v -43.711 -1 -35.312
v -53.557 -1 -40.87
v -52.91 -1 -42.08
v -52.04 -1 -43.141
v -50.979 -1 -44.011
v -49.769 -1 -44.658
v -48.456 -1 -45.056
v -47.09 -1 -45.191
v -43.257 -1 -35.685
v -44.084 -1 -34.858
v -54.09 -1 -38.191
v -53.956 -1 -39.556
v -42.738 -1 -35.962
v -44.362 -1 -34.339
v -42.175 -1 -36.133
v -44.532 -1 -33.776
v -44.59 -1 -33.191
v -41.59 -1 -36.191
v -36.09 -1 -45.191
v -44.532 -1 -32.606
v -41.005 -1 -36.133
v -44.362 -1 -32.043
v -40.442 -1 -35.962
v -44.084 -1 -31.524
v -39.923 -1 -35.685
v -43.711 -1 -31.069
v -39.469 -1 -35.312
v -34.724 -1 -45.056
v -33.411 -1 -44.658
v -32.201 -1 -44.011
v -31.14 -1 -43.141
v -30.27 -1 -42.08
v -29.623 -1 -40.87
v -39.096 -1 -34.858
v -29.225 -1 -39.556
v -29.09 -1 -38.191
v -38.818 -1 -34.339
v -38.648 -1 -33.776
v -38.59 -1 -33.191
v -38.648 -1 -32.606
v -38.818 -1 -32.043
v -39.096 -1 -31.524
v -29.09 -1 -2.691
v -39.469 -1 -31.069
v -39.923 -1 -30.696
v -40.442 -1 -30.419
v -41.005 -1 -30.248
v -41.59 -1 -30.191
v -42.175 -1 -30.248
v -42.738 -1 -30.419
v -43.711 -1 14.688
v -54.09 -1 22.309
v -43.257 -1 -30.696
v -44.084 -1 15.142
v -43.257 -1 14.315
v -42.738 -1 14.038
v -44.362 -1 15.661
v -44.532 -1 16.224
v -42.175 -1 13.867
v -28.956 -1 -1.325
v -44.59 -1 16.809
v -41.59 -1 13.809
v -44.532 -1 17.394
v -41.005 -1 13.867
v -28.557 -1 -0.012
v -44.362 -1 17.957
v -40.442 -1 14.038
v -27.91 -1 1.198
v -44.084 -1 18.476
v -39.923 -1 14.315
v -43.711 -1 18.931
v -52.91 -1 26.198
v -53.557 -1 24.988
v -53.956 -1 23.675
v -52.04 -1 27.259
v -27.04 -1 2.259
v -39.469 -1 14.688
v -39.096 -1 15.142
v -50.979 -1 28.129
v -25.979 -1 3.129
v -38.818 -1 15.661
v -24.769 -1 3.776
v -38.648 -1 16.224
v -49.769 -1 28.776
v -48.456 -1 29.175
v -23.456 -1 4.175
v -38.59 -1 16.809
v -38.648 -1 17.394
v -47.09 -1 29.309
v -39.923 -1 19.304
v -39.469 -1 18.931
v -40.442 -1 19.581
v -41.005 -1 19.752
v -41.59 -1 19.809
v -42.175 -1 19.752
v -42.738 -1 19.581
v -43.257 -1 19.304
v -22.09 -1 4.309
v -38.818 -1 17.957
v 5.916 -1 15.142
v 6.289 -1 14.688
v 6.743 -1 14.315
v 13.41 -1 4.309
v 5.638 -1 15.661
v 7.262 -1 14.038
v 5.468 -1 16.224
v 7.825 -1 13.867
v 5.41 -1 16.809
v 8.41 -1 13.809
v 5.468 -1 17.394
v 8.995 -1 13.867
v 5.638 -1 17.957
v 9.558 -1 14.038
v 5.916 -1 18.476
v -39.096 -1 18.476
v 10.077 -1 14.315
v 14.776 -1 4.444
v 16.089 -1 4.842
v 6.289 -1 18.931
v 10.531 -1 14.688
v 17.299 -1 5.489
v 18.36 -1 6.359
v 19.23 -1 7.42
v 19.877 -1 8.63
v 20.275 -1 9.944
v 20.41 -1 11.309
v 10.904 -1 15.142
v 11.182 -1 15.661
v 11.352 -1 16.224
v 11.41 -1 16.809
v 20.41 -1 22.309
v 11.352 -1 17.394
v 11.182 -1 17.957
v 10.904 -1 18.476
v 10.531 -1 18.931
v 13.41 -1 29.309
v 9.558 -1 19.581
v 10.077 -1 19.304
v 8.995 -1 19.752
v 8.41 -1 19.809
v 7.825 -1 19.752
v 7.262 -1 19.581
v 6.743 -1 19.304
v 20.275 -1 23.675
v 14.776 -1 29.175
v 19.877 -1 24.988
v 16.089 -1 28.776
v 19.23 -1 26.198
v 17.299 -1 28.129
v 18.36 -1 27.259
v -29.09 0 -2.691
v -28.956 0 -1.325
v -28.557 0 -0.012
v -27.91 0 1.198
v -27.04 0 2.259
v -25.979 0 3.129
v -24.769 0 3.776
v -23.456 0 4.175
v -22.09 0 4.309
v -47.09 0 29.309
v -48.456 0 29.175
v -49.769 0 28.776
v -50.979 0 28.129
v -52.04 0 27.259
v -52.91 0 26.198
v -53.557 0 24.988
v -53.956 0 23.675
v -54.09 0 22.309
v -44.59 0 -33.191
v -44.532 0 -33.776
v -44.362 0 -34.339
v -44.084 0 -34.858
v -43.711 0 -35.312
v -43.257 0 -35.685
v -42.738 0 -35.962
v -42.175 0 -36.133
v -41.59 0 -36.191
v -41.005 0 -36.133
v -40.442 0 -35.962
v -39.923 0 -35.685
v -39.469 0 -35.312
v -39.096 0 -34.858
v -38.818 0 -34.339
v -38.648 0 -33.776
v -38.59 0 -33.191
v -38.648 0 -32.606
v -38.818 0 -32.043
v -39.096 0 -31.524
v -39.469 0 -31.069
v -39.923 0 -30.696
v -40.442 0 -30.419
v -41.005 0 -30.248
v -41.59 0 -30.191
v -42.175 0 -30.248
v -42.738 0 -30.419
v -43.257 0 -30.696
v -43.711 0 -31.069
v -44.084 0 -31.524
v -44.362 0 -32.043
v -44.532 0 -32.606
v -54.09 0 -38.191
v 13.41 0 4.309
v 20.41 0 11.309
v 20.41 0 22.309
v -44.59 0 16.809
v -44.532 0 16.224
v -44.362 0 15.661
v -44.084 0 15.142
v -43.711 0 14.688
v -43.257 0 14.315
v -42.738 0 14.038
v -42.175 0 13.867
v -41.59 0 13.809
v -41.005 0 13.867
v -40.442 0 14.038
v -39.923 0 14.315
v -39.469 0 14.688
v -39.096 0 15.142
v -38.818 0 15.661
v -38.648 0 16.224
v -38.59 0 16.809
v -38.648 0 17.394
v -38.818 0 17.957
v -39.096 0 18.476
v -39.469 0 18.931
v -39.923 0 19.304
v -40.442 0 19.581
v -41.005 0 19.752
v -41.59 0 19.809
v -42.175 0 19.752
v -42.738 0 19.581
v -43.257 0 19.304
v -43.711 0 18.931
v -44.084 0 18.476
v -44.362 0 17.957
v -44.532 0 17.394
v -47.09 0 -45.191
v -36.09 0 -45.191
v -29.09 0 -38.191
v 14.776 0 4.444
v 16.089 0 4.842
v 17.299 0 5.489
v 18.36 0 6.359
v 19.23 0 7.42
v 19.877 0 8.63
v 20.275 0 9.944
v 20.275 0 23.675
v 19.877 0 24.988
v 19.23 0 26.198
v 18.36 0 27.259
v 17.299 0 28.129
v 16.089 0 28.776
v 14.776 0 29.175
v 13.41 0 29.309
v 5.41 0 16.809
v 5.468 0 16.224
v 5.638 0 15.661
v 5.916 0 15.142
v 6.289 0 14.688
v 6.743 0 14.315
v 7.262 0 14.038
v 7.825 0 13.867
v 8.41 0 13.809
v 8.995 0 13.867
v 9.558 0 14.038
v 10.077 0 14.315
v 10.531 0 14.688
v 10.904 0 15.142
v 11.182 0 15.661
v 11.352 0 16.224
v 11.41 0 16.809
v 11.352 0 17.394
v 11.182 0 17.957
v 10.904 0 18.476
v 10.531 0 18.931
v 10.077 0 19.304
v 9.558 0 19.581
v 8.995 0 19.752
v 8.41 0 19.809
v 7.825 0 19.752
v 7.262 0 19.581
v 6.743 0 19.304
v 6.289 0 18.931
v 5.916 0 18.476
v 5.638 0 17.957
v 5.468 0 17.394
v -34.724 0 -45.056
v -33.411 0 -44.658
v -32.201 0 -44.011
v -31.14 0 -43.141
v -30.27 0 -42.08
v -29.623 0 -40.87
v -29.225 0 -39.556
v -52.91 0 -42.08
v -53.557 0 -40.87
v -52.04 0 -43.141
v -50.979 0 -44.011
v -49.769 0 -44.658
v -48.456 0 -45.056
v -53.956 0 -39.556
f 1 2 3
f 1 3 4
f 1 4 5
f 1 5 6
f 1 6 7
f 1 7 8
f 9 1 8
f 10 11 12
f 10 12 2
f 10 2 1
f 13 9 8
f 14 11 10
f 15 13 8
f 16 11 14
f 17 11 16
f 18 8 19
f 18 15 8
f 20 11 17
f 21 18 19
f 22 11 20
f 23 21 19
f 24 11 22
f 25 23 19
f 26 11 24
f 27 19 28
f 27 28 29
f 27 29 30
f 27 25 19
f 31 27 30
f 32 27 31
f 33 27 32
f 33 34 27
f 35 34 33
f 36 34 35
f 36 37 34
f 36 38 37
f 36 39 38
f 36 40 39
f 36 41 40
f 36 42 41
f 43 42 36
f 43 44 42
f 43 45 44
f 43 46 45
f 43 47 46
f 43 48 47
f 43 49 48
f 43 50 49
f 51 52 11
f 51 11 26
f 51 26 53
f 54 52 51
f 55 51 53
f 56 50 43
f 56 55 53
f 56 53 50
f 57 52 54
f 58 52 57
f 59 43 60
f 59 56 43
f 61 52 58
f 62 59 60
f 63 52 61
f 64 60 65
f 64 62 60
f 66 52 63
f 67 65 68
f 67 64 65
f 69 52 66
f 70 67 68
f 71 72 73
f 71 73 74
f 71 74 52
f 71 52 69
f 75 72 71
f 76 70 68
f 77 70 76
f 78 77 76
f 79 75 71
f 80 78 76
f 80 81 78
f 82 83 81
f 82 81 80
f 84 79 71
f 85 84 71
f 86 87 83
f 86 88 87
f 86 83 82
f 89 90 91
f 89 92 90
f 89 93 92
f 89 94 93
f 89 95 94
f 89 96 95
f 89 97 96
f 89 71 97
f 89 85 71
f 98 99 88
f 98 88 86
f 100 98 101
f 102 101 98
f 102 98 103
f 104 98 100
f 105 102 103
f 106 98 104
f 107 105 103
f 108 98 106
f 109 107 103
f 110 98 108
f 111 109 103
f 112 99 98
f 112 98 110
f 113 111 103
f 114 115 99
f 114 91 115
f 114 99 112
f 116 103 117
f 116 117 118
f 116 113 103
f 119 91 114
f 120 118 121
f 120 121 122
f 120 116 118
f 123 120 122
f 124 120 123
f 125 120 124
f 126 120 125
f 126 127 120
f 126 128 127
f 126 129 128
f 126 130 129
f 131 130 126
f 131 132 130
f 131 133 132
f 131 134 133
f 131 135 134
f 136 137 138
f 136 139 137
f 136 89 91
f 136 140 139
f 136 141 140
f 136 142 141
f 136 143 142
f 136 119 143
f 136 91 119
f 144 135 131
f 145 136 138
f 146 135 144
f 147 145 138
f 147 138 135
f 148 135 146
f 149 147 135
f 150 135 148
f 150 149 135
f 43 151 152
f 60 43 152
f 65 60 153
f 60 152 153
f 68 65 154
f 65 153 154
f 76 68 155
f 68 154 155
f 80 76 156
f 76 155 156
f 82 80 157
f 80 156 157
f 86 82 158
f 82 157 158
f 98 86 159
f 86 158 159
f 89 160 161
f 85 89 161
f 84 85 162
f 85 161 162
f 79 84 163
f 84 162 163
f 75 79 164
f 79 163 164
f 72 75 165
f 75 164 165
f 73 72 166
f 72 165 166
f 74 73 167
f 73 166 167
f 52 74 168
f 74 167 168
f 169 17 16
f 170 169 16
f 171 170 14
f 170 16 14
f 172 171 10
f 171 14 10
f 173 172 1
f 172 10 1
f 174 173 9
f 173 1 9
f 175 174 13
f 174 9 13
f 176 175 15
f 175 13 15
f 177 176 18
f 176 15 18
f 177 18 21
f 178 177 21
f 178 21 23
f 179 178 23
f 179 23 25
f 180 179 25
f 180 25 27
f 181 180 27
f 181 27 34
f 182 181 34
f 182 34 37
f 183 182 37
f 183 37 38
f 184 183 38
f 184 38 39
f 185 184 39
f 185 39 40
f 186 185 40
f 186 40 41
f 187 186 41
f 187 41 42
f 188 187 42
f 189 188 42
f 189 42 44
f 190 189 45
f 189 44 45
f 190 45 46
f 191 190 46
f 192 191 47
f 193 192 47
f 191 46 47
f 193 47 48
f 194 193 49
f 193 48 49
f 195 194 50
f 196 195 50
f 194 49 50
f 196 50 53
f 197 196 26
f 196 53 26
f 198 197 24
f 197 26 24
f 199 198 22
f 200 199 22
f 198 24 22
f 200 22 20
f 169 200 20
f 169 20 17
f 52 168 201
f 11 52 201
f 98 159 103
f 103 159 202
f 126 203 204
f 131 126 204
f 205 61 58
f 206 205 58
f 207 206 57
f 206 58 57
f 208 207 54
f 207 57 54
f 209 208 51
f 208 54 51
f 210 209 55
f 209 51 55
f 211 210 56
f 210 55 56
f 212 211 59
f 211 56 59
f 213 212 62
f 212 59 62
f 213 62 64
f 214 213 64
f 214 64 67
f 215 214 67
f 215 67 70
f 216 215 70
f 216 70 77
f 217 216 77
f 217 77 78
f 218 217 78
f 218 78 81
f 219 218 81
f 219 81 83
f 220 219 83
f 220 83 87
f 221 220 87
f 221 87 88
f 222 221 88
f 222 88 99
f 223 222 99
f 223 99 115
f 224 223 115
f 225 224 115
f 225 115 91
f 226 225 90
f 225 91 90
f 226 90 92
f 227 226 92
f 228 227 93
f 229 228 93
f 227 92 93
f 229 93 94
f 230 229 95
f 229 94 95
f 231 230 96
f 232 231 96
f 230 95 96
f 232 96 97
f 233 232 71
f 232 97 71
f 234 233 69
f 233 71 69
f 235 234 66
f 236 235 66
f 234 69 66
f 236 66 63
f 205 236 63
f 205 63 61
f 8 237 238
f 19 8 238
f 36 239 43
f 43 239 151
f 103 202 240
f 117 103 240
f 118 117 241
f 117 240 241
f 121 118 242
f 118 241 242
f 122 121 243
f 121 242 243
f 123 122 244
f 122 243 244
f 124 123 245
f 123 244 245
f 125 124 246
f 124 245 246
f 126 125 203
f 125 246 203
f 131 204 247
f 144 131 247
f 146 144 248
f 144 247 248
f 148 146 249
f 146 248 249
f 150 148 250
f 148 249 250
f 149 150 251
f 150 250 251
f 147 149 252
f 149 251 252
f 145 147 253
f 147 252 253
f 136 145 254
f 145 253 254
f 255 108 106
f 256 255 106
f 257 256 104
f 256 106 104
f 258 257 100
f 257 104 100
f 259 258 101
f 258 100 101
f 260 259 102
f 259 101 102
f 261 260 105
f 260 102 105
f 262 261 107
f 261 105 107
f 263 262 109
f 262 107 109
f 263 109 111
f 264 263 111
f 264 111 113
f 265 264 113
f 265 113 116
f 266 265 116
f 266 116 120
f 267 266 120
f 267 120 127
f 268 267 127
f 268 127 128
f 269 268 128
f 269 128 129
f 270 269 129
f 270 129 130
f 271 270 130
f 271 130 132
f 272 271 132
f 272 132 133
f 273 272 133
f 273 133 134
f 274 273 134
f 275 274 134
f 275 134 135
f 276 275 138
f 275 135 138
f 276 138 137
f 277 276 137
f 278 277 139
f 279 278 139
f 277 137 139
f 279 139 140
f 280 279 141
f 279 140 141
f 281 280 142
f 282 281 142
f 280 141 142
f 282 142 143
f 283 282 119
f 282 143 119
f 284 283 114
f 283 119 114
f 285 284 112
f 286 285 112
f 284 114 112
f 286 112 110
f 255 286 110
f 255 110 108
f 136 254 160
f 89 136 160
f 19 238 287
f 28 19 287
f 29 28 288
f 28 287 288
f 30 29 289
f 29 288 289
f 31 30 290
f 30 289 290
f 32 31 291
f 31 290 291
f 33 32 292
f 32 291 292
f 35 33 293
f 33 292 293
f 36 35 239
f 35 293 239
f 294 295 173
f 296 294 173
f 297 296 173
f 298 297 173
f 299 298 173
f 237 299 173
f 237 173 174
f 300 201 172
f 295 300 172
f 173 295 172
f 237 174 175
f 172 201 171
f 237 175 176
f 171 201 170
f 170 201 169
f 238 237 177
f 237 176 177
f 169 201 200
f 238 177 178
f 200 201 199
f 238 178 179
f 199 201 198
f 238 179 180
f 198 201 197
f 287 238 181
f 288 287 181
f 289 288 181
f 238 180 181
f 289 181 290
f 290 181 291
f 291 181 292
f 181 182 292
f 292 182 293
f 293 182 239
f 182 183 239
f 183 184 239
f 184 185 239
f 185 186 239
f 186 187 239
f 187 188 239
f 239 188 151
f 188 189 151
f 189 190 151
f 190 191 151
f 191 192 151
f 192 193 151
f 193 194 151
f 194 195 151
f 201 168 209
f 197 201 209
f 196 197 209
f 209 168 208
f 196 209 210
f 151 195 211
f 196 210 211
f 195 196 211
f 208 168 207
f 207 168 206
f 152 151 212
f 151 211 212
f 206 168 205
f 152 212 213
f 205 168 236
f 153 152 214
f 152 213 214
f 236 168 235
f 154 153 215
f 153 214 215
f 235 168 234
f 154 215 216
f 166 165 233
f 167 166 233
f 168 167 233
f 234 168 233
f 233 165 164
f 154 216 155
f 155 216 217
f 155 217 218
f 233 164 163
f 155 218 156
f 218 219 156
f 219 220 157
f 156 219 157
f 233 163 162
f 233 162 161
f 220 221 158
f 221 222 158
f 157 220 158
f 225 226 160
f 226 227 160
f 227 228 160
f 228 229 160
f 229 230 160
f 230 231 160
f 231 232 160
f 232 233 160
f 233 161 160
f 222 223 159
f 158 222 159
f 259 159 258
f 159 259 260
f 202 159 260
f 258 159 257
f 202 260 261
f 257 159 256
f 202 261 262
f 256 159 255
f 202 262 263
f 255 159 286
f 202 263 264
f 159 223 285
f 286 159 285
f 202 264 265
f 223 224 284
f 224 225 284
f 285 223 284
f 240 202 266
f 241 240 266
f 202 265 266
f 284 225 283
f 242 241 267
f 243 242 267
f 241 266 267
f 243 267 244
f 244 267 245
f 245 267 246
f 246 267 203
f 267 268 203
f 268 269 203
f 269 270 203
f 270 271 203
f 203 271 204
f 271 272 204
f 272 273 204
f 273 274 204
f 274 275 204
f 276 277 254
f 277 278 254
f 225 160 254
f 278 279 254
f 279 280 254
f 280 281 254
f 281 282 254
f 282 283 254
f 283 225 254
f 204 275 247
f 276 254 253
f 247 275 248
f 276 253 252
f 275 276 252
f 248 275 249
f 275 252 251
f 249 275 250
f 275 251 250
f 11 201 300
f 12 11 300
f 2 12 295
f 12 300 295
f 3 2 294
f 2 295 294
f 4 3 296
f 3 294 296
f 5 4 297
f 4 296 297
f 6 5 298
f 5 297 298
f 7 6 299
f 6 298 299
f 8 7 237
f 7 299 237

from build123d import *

# Parameters (mm, degrees)
F1_DEPTH = 1
F2_D     = 6


with BuildPart() as f1:
    # F0 (on Front) → F1 (new body)
    with BuildSketch(Plane.XZ):
        with BuildLine():
            Line((-54.0900086572, 22.3091947654), (-54.0900086572, -38.1908052346))
            ThreePointArc((-54.0900086572, -38.1908052346), (-52.0397561255, -43.1405527029), (-47.0900086572, -45.1908052346))
            Line((-47.0900086572, -45.1908052346), (-36.0900086572, -45.1908052346))
            ThreePointArc((-36.0900086572, -45.1908052346), (-31.1402611889, -43.1405527029), (-29.0900086572, -38.1908052346))
            Line((-29.0900086572, -38.1908052346), (-29.0900086572, -2.6908052346))
            ThreePointArc((-29.0900086572, -2.6908052346), (-27.0397561255, 2.2589422338), (-22.0900086572, 4.3091947654))
            Line((-22.0900086572, 4.3091947654), (13.4099913428, 4.3091947654))
            ThreePointArc((13.4099913428, 4.3091947654), (18.3597388111, 6.3594472971), (20.4099913428, 11.3091947654))
            Line((20.4099913428, 11.3091947654), (20.4099913428, 22.3091947654))
            ThreePointArc((20.4099913428, 22.3091947654), (18.3597388111, 27.2589422338), (13.4099913428, 29.3091947654))
            Line((13.4099913428, 29.3091947654), (-47.0900086572, 29.3091947654))
            ThreePointArc((-47.0900086572, 29.3091947654), (-52.0397561255, 27.2589422338), (-54.0900086572, 22.3091947654))
        make_face()
    extrude(amount=F1_DEPTH)

    # F2 (through all)
    with Locations(Plane(origin=(0, 0, 0), x_dir=(1, 0, 0), z_dir=(0, 1, 0))):
        with Locations((-41.5900086572, -16.8091947654), (8.4099913428, -16.8091947654), (-41.5900086572, 33.1908052346)):
            Hole(F2_D / 2)


solid = f1.part
